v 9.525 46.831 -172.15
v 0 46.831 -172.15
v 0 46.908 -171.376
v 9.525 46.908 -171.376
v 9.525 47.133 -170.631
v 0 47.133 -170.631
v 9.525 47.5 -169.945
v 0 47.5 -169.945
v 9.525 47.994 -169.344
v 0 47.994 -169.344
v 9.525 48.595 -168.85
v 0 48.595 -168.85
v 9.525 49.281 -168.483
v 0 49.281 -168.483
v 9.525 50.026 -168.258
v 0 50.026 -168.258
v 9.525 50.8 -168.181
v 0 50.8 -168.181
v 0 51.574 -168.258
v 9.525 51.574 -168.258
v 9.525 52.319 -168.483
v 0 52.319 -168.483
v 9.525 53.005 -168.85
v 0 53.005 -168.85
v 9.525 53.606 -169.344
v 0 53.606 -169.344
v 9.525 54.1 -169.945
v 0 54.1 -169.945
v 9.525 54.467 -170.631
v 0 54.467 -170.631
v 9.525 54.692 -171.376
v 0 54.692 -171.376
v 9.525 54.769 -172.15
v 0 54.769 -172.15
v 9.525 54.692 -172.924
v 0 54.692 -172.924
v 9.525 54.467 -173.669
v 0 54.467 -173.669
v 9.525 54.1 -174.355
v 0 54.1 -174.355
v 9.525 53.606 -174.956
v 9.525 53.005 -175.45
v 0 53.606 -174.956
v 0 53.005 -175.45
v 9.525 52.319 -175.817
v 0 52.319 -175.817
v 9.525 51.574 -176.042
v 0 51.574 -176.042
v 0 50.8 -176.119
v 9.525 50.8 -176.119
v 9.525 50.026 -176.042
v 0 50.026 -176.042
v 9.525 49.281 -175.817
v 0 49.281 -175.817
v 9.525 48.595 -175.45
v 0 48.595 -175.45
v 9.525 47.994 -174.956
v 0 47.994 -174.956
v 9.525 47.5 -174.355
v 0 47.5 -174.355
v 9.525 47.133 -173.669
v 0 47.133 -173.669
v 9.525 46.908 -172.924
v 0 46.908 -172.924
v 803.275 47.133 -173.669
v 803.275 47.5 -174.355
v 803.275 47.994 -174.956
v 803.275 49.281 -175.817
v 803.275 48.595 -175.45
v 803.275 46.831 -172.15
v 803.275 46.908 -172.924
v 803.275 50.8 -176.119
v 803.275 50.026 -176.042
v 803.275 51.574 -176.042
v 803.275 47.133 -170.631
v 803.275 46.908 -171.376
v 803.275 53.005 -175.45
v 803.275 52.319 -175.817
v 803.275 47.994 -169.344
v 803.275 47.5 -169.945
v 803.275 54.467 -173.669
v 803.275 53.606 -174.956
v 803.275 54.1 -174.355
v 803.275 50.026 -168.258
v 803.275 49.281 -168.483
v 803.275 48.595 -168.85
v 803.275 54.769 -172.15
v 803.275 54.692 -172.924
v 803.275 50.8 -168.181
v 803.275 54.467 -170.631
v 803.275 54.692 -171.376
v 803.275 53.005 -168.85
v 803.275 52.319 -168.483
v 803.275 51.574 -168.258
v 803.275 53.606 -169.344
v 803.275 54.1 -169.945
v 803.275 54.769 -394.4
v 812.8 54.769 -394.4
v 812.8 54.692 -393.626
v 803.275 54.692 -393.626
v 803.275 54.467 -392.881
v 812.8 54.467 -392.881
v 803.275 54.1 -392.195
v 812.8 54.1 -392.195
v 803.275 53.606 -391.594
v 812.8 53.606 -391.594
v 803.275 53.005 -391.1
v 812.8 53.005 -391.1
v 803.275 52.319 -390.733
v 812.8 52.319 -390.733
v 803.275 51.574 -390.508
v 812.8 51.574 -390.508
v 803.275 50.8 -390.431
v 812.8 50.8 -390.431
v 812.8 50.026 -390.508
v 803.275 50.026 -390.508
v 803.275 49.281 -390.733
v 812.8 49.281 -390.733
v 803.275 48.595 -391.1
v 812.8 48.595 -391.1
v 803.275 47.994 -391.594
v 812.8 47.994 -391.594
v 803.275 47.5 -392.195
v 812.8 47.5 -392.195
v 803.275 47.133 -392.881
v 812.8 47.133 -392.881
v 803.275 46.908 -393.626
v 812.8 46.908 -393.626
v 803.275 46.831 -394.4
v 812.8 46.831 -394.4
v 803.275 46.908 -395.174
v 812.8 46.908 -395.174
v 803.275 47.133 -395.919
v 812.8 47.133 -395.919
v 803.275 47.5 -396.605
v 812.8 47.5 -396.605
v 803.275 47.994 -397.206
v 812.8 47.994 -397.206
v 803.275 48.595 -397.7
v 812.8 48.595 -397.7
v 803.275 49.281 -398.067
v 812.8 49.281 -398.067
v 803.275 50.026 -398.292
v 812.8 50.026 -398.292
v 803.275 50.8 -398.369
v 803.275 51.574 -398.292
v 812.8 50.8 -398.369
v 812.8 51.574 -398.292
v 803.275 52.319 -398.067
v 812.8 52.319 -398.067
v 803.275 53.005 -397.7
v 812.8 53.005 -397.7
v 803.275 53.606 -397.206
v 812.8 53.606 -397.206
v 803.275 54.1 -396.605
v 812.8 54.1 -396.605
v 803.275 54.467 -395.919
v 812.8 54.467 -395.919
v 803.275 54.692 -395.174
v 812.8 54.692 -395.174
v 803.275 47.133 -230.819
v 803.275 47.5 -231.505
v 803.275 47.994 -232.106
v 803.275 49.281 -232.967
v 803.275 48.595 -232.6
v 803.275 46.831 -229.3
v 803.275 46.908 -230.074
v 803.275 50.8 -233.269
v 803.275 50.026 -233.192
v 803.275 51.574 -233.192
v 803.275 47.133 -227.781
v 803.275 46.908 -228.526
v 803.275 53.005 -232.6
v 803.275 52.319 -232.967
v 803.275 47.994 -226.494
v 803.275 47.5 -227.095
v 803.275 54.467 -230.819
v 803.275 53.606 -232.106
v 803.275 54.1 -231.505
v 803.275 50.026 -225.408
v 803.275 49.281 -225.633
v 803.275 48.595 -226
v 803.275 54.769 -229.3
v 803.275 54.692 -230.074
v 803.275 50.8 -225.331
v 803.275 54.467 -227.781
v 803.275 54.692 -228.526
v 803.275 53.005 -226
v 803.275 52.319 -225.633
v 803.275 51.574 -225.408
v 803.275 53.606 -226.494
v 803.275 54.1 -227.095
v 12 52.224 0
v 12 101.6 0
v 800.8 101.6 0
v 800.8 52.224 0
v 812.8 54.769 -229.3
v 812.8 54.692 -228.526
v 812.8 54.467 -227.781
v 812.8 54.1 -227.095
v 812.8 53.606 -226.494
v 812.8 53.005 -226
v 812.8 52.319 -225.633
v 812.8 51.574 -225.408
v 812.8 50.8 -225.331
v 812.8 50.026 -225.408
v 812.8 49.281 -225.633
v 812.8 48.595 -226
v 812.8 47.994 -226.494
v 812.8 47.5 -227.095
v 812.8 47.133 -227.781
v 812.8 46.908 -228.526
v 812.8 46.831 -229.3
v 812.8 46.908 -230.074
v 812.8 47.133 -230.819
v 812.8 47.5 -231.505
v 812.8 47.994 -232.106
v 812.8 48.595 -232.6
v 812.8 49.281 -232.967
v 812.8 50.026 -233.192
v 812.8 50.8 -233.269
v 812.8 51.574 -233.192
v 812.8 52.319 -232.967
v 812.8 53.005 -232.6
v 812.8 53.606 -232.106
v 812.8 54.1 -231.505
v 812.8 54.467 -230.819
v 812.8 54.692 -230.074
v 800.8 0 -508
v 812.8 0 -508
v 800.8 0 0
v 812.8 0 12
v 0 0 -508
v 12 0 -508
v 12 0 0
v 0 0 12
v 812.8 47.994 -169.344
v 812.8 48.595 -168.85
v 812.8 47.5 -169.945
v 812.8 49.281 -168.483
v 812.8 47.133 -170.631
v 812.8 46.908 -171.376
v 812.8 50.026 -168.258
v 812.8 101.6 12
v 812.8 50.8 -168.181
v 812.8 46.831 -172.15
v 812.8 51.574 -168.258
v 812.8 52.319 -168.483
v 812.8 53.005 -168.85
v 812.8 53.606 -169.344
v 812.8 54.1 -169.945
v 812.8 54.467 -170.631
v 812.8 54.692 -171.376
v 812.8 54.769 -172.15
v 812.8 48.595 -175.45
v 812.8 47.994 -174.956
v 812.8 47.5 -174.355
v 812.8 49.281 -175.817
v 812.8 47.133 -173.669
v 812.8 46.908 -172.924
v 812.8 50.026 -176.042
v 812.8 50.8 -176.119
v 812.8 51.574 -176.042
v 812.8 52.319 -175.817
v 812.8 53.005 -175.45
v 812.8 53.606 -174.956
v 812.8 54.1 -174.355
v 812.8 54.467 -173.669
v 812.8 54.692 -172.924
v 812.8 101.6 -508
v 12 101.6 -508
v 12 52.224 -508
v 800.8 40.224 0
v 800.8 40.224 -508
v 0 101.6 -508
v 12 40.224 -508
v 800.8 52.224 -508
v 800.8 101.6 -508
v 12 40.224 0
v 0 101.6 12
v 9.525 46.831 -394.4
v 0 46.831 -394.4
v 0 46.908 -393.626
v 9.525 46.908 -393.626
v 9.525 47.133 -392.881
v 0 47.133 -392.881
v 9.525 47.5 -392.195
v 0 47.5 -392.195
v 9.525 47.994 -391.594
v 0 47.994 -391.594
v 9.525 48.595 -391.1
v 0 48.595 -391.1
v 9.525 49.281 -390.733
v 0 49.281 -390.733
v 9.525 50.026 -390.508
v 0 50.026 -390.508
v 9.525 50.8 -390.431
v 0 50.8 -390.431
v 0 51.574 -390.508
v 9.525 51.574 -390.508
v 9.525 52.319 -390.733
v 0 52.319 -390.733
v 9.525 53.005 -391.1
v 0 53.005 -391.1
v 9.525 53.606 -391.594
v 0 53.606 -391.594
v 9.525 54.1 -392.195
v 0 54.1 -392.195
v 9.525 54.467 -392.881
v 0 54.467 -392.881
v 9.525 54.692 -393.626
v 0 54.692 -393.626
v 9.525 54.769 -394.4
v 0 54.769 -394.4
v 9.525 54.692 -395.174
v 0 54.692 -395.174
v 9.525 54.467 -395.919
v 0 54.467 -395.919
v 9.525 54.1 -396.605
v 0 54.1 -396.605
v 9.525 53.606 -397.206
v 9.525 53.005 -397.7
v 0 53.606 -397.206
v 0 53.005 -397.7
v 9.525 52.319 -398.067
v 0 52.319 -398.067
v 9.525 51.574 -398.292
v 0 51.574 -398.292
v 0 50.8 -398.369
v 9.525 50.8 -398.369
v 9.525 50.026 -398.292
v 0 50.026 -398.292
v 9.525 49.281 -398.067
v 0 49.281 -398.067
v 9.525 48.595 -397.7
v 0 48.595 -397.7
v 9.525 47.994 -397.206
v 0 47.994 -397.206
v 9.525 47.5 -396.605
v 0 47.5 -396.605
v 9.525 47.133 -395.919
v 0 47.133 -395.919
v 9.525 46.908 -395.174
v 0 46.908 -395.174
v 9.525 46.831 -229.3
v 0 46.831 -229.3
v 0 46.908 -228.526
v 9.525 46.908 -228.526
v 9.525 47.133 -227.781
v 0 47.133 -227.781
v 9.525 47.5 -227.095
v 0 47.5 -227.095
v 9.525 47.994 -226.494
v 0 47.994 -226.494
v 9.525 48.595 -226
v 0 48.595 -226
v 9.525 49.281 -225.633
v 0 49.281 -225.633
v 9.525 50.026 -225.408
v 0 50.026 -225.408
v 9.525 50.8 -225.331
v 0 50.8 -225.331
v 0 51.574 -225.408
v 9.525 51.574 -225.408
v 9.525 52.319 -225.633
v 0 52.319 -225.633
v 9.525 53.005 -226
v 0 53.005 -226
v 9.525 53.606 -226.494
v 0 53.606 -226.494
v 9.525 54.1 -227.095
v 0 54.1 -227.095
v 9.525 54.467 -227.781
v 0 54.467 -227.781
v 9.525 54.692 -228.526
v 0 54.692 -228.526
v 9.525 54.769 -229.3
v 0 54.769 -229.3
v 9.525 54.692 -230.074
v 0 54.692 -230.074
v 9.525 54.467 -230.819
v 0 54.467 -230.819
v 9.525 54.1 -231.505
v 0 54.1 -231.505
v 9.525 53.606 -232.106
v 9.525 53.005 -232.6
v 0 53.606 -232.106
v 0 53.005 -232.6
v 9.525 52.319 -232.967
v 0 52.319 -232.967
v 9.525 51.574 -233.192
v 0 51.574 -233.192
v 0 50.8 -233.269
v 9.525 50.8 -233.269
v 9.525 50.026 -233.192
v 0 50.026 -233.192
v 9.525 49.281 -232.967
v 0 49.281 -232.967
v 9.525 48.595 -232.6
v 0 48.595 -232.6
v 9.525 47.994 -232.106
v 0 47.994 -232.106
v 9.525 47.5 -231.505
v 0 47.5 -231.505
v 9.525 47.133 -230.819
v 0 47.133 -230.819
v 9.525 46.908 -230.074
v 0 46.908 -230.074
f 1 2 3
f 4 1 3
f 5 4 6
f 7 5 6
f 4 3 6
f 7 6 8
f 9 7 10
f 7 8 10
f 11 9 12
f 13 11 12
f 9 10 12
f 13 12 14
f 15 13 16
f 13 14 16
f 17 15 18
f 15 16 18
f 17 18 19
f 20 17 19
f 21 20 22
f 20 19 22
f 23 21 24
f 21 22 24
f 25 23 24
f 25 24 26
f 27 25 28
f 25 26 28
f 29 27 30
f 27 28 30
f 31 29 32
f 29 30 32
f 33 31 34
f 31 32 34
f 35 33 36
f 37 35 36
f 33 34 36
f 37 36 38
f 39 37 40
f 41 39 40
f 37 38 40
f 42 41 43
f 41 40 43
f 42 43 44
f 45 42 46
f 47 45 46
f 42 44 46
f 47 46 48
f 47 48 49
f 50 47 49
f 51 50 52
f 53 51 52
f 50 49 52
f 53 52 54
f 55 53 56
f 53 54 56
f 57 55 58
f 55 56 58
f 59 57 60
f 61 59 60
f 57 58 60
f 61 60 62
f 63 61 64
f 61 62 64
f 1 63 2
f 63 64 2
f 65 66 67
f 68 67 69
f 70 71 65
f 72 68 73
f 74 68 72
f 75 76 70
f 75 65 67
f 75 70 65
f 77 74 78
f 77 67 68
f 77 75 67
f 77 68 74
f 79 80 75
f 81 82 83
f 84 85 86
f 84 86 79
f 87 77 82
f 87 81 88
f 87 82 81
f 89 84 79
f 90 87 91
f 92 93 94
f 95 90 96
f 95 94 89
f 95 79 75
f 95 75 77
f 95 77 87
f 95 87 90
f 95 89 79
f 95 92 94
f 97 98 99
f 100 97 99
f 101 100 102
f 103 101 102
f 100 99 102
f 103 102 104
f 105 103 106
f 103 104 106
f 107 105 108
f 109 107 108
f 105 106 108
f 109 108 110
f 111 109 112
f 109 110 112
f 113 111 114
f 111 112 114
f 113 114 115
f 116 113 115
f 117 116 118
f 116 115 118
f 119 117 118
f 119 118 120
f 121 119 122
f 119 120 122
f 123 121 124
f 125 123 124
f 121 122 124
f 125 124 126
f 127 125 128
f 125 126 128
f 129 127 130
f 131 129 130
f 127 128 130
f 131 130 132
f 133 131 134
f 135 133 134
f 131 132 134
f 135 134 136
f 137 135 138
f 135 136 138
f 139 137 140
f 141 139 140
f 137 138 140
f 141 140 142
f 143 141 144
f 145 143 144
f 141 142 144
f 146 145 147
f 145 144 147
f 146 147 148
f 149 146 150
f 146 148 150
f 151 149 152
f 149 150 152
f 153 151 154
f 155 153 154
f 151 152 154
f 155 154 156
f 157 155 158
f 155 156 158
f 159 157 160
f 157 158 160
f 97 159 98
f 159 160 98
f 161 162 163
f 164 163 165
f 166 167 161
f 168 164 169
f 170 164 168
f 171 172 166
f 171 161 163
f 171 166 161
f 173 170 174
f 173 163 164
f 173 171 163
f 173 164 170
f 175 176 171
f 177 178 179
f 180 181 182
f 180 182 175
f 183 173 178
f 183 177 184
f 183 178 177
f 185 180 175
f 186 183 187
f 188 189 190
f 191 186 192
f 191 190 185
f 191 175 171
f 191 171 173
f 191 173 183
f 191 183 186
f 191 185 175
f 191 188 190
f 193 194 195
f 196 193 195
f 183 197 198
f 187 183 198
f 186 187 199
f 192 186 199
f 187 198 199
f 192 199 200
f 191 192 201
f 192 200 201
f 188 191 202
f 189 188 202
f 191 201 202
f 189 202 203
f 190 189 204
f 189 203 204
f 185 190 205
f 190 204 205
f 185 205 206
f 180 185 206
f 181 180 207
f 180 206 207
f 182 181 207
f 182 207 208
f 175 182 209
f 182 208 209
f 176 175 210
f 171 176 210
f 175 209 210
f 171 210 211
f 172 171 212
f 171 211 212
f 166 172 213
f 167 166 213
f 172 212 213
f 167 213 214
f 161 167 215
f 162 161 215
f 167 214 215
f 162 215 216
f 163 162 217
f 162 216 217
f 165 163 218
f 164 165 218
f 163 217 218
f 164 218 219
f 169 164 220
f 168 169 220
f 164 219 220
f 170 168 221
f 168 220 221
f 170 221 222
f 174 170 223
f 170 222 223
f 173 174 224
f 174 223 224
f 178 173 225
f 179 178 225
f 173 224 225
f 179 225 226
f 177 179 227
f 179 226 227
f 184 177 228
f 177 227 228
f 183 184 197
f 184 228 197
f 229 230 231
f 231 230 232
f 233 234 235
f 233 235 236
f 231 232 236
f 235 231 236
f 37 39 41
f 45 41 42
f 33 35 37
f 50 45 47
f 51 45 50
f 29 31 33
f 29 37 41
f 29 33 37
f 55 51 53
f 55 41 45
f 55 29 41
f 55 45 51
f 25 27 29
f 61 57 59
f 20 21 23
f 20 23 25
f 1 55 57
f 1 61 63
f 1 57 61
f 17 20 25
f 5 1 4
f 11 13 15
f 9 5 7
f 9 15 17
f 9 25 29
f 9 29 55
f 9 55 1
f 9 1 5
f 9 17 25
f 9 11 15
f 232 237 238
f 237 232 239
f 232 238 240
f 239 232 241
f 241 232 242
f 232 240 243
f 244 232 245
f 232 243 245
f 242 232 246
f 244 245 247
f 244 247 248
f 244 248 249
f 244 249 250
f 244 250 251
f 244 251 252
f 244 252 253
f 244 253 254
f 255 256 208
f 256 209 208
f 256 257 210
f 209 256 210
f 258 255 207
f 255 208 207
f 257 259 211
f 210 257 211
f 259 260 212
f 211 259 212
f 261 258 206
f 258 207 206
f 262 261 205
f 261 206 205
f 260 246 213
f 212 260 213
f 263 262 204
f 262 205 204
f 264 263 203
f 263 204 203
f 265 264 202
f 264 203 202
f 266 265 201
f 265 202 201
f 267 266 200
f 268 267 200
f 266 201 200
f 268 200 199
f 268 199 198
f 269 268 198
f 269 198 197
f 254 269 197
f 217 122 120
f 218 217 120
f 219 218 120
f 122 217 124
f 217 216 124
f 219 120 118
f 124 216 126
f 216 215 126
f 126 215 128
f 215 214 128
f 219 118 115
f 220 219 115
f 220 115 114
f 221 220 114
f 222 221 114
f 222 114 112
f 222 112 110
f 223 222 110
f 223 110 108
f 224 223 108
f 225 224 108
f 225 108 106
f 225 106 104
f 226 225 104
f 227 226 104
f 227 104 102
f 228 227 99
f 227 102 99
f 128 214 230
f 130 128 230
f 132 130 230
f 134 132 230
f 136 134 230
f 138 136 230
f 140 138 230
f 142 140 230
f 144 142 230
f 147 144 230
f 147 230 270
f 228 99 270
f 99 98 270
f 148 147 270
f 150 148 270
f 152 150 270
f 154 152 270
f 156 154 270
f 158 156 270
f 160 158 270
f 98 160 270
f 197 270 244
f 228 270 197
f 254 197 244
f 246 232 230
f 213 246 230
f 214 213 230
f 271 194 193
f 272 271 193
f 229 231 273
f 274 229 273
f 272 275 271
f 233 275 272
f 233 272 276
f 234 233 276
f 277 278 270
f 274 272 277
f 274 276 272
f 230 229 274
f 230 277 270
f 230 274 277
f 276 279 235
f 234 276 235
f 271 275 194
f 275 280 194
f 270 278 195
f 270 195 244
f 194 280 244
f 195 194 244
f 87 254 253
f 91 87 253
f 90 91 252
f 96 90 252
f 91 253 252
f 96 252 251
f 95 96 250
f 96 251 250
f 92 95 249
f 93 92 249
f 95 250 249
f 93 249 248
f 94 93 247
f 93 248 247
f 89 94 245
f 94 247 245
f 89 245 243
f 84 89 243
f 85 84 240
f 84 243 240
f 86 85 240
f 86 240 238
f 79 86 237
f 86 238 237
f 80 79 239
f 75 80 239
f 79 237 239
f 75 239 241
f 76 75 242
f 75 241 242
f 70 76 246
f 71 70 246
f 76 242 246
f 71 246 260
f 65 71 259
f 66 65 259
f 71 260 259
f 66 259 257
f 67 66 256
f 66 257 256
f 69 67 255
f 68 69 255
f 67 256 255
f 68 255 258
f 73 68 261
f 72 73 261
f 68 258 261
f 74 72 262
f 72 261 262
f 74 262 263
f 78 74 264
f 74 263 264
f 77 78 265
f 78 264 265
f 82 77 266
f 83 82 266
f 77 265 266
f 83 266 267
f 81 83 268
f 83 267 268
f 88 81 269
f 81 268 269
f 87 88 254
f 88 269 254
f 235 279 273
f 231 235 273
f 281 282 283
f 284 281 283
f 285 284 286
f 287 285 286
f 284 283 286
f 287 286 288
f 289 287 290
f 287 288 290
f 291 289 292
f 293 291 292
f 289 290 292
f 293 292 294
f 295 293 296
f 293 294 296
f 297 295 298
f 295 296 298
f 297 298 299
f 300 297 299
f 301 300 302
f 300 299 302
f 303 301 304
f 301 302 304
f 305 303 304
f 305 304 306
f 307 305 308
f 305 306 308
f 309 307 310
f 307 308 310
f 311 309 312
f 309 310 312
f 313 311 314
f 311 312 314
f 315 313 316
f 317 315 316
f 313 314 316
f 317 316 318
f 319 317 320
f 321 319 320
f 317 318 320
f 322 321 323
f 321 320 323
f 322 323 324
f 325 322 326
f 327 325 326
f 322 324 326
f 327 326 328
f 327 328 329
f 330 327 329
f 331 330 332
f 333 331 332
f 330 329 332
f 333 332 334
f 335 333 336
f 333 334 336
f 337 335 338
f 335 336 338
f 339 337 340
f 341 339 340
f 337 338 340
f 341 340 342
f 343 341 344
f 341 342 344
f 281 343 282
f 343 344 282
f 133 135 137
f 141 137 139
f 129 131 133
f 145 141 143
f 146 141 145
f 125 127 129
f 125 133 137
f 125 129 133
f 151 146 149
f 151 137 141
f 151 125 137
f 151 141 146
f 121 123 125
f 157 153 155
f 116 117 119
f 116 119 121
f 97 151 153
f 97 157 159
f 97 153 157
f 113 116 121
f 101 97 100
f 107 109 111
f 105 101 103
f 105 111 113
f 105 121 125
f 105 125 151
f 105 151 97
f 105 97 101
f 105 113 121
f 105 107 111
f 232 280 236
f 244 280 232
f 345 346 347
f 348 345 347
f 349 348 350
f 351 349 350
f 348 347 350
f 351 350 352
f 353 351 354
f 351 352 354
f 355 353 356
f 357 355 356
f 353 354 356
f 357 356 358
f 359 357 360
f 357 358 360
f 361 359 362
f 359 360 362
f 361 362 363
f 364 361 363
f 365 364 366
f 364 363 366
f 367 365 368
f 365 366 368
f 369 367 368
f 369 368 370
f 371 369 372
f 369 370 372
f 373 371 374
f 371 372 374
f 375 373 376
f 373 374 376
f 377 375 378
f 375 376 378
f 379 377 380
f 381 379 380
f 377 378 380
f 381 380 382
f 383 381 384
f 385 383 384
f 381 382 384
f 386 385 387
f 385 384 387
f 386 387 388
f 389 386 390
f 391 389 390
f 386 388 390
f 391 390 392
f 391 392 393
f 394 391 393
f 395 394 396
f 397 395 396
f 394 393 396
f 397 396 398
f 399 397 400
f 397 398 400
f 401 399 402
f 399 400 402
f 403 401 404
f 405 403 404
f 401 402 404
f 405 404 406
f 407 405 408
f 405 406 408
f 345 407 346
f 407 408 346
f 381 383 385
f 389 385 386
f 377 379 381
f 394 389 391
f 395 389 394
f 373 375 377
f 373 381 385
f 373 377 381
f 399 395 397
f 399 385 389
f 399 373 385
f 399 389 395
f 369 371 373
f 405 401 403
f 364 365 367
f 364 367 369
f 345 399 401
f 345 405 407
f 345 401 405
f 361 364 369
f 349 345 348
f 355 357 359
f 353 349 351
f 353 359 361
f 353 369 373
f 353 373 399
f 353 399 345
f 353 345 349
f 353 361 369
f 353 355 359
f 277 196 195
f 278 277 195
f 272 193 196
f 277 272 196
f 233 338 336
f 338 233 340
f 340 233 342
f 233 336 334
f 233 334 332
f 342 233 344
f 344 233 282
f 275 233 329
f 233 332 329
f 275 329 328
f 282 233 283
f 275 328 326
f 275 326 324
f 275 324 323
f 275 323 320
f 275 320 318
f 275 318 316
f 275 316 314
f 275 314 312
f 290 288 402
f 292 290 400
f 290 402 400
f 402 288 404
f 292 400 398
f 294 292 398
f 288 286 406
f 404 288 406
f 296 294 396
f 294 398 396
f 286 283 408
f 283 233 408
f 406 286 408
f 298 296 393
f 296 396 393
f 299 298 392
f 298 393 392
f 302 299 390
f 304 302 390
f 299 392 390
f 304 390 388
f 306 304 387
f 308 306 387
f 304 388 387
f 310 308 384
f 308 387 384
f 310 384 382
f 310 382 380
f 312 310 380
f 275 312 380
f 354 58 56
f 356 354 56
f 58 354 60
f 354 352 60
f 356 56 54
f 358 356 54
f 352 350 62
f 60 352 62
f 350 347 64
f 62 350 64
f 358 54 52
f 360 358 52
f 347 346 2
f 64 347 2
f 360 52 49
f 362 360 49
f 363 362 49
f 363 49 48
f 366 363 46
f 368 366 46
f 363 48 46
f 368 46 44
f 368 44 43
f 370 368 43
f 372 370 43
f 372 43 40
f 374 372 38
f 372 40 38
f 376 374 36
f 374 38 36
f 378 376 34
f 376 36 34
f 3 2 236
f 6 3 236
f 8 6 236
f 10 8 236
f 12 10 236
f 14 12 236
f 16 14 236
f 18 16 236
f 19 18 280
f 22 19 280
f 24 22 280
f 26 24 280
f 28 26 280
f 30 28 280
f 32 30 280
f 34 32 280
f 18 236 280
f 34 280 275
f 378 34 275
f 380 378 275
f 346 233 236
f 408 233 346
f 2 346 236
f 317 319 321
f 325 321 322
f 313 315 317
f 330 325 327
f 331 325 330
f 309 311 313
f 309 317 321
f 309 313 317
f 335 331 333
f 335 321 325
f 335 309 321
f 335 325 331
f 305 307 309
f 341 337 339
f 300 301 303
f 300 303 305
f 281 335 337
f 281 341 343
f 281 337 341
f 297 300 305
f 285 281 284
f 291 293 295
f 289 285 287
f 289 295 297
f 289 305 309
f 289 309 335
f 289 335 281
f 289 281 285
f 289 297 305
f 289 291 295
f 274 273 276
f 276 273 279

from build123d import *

# Parameters (mm, degrees)
F0_W     = 812.8
F0_H     = 101.6
F1_DEPTH = 12
F3_DEPTH = 508
F4_R     = 3.96875
F5_DEPTH = 9.525
F6_R     = 3.96875
F7_DEPTH = 9.525


# Not quite as in the source:
# - a length typed as a fraction of an inch, garbled in the dataset ("3 / 203.2 mm" for 3/8 in), is restored


with BuildPart() as f1:
    # F0 (on Top) → F1 (new body)
    with BuildSketch(Plane.XY):
        with Locations((406.4, 50.8)):
            Rectangle(F0_W, F0_H)
    extrude(amount=F1_DEPTH)

    # F2 (on face) → F3 (join)
    with BuildSketch(Plane(origin=(0, 0, 0), x_dir=(1, 0, 0), z_dir=(0, 0, -1))):
        Polygon((12, 0), (0, 0), (0, -101.6), (12, -101.6), (12, -52.2239353538), (800.8, -52.2239353538), (800.8, -101.6), (812.8, -101.6), (812.8, 0), (800.8, 0), (800.8, -40.2239353538), (12, -40.2239353538), align=None)
    extrude(amount=F3_DEPTH)

    # F4 (on face) → F5 (cut)
    with BuildSketch(Plane.YZ.offset(812.8)):
        with Locations((50.8, -172.15)):
            Circle(F4_R)
        with Locations((50.8, -229.3)):
            Circle(F4_R)
        with Locations((50.8, -394.4)):
            Circle(F4_R)
    extrude(amount=-F5_DEPTH, mode=Mode.SUBTRACT)

    # F6 (on face) → F7 (cut)
    with BuildSketch(Plane(origin=(0, 0, 0), x_dir=(0, -1, 0), z_dir=(-1, 0, 0))):
        with Locations((-50.8, -172.15)):
            Circle(F6_R)
        with Locations((-50.8, -229.3)):
            Circle(F6_R)
        with Locations((-50.8, -394.4)):
            Circle(F6_R)
    extrude(amount=-F7_DEPTH, mode=Mode.SUBTRACT)


solid = f1.part
